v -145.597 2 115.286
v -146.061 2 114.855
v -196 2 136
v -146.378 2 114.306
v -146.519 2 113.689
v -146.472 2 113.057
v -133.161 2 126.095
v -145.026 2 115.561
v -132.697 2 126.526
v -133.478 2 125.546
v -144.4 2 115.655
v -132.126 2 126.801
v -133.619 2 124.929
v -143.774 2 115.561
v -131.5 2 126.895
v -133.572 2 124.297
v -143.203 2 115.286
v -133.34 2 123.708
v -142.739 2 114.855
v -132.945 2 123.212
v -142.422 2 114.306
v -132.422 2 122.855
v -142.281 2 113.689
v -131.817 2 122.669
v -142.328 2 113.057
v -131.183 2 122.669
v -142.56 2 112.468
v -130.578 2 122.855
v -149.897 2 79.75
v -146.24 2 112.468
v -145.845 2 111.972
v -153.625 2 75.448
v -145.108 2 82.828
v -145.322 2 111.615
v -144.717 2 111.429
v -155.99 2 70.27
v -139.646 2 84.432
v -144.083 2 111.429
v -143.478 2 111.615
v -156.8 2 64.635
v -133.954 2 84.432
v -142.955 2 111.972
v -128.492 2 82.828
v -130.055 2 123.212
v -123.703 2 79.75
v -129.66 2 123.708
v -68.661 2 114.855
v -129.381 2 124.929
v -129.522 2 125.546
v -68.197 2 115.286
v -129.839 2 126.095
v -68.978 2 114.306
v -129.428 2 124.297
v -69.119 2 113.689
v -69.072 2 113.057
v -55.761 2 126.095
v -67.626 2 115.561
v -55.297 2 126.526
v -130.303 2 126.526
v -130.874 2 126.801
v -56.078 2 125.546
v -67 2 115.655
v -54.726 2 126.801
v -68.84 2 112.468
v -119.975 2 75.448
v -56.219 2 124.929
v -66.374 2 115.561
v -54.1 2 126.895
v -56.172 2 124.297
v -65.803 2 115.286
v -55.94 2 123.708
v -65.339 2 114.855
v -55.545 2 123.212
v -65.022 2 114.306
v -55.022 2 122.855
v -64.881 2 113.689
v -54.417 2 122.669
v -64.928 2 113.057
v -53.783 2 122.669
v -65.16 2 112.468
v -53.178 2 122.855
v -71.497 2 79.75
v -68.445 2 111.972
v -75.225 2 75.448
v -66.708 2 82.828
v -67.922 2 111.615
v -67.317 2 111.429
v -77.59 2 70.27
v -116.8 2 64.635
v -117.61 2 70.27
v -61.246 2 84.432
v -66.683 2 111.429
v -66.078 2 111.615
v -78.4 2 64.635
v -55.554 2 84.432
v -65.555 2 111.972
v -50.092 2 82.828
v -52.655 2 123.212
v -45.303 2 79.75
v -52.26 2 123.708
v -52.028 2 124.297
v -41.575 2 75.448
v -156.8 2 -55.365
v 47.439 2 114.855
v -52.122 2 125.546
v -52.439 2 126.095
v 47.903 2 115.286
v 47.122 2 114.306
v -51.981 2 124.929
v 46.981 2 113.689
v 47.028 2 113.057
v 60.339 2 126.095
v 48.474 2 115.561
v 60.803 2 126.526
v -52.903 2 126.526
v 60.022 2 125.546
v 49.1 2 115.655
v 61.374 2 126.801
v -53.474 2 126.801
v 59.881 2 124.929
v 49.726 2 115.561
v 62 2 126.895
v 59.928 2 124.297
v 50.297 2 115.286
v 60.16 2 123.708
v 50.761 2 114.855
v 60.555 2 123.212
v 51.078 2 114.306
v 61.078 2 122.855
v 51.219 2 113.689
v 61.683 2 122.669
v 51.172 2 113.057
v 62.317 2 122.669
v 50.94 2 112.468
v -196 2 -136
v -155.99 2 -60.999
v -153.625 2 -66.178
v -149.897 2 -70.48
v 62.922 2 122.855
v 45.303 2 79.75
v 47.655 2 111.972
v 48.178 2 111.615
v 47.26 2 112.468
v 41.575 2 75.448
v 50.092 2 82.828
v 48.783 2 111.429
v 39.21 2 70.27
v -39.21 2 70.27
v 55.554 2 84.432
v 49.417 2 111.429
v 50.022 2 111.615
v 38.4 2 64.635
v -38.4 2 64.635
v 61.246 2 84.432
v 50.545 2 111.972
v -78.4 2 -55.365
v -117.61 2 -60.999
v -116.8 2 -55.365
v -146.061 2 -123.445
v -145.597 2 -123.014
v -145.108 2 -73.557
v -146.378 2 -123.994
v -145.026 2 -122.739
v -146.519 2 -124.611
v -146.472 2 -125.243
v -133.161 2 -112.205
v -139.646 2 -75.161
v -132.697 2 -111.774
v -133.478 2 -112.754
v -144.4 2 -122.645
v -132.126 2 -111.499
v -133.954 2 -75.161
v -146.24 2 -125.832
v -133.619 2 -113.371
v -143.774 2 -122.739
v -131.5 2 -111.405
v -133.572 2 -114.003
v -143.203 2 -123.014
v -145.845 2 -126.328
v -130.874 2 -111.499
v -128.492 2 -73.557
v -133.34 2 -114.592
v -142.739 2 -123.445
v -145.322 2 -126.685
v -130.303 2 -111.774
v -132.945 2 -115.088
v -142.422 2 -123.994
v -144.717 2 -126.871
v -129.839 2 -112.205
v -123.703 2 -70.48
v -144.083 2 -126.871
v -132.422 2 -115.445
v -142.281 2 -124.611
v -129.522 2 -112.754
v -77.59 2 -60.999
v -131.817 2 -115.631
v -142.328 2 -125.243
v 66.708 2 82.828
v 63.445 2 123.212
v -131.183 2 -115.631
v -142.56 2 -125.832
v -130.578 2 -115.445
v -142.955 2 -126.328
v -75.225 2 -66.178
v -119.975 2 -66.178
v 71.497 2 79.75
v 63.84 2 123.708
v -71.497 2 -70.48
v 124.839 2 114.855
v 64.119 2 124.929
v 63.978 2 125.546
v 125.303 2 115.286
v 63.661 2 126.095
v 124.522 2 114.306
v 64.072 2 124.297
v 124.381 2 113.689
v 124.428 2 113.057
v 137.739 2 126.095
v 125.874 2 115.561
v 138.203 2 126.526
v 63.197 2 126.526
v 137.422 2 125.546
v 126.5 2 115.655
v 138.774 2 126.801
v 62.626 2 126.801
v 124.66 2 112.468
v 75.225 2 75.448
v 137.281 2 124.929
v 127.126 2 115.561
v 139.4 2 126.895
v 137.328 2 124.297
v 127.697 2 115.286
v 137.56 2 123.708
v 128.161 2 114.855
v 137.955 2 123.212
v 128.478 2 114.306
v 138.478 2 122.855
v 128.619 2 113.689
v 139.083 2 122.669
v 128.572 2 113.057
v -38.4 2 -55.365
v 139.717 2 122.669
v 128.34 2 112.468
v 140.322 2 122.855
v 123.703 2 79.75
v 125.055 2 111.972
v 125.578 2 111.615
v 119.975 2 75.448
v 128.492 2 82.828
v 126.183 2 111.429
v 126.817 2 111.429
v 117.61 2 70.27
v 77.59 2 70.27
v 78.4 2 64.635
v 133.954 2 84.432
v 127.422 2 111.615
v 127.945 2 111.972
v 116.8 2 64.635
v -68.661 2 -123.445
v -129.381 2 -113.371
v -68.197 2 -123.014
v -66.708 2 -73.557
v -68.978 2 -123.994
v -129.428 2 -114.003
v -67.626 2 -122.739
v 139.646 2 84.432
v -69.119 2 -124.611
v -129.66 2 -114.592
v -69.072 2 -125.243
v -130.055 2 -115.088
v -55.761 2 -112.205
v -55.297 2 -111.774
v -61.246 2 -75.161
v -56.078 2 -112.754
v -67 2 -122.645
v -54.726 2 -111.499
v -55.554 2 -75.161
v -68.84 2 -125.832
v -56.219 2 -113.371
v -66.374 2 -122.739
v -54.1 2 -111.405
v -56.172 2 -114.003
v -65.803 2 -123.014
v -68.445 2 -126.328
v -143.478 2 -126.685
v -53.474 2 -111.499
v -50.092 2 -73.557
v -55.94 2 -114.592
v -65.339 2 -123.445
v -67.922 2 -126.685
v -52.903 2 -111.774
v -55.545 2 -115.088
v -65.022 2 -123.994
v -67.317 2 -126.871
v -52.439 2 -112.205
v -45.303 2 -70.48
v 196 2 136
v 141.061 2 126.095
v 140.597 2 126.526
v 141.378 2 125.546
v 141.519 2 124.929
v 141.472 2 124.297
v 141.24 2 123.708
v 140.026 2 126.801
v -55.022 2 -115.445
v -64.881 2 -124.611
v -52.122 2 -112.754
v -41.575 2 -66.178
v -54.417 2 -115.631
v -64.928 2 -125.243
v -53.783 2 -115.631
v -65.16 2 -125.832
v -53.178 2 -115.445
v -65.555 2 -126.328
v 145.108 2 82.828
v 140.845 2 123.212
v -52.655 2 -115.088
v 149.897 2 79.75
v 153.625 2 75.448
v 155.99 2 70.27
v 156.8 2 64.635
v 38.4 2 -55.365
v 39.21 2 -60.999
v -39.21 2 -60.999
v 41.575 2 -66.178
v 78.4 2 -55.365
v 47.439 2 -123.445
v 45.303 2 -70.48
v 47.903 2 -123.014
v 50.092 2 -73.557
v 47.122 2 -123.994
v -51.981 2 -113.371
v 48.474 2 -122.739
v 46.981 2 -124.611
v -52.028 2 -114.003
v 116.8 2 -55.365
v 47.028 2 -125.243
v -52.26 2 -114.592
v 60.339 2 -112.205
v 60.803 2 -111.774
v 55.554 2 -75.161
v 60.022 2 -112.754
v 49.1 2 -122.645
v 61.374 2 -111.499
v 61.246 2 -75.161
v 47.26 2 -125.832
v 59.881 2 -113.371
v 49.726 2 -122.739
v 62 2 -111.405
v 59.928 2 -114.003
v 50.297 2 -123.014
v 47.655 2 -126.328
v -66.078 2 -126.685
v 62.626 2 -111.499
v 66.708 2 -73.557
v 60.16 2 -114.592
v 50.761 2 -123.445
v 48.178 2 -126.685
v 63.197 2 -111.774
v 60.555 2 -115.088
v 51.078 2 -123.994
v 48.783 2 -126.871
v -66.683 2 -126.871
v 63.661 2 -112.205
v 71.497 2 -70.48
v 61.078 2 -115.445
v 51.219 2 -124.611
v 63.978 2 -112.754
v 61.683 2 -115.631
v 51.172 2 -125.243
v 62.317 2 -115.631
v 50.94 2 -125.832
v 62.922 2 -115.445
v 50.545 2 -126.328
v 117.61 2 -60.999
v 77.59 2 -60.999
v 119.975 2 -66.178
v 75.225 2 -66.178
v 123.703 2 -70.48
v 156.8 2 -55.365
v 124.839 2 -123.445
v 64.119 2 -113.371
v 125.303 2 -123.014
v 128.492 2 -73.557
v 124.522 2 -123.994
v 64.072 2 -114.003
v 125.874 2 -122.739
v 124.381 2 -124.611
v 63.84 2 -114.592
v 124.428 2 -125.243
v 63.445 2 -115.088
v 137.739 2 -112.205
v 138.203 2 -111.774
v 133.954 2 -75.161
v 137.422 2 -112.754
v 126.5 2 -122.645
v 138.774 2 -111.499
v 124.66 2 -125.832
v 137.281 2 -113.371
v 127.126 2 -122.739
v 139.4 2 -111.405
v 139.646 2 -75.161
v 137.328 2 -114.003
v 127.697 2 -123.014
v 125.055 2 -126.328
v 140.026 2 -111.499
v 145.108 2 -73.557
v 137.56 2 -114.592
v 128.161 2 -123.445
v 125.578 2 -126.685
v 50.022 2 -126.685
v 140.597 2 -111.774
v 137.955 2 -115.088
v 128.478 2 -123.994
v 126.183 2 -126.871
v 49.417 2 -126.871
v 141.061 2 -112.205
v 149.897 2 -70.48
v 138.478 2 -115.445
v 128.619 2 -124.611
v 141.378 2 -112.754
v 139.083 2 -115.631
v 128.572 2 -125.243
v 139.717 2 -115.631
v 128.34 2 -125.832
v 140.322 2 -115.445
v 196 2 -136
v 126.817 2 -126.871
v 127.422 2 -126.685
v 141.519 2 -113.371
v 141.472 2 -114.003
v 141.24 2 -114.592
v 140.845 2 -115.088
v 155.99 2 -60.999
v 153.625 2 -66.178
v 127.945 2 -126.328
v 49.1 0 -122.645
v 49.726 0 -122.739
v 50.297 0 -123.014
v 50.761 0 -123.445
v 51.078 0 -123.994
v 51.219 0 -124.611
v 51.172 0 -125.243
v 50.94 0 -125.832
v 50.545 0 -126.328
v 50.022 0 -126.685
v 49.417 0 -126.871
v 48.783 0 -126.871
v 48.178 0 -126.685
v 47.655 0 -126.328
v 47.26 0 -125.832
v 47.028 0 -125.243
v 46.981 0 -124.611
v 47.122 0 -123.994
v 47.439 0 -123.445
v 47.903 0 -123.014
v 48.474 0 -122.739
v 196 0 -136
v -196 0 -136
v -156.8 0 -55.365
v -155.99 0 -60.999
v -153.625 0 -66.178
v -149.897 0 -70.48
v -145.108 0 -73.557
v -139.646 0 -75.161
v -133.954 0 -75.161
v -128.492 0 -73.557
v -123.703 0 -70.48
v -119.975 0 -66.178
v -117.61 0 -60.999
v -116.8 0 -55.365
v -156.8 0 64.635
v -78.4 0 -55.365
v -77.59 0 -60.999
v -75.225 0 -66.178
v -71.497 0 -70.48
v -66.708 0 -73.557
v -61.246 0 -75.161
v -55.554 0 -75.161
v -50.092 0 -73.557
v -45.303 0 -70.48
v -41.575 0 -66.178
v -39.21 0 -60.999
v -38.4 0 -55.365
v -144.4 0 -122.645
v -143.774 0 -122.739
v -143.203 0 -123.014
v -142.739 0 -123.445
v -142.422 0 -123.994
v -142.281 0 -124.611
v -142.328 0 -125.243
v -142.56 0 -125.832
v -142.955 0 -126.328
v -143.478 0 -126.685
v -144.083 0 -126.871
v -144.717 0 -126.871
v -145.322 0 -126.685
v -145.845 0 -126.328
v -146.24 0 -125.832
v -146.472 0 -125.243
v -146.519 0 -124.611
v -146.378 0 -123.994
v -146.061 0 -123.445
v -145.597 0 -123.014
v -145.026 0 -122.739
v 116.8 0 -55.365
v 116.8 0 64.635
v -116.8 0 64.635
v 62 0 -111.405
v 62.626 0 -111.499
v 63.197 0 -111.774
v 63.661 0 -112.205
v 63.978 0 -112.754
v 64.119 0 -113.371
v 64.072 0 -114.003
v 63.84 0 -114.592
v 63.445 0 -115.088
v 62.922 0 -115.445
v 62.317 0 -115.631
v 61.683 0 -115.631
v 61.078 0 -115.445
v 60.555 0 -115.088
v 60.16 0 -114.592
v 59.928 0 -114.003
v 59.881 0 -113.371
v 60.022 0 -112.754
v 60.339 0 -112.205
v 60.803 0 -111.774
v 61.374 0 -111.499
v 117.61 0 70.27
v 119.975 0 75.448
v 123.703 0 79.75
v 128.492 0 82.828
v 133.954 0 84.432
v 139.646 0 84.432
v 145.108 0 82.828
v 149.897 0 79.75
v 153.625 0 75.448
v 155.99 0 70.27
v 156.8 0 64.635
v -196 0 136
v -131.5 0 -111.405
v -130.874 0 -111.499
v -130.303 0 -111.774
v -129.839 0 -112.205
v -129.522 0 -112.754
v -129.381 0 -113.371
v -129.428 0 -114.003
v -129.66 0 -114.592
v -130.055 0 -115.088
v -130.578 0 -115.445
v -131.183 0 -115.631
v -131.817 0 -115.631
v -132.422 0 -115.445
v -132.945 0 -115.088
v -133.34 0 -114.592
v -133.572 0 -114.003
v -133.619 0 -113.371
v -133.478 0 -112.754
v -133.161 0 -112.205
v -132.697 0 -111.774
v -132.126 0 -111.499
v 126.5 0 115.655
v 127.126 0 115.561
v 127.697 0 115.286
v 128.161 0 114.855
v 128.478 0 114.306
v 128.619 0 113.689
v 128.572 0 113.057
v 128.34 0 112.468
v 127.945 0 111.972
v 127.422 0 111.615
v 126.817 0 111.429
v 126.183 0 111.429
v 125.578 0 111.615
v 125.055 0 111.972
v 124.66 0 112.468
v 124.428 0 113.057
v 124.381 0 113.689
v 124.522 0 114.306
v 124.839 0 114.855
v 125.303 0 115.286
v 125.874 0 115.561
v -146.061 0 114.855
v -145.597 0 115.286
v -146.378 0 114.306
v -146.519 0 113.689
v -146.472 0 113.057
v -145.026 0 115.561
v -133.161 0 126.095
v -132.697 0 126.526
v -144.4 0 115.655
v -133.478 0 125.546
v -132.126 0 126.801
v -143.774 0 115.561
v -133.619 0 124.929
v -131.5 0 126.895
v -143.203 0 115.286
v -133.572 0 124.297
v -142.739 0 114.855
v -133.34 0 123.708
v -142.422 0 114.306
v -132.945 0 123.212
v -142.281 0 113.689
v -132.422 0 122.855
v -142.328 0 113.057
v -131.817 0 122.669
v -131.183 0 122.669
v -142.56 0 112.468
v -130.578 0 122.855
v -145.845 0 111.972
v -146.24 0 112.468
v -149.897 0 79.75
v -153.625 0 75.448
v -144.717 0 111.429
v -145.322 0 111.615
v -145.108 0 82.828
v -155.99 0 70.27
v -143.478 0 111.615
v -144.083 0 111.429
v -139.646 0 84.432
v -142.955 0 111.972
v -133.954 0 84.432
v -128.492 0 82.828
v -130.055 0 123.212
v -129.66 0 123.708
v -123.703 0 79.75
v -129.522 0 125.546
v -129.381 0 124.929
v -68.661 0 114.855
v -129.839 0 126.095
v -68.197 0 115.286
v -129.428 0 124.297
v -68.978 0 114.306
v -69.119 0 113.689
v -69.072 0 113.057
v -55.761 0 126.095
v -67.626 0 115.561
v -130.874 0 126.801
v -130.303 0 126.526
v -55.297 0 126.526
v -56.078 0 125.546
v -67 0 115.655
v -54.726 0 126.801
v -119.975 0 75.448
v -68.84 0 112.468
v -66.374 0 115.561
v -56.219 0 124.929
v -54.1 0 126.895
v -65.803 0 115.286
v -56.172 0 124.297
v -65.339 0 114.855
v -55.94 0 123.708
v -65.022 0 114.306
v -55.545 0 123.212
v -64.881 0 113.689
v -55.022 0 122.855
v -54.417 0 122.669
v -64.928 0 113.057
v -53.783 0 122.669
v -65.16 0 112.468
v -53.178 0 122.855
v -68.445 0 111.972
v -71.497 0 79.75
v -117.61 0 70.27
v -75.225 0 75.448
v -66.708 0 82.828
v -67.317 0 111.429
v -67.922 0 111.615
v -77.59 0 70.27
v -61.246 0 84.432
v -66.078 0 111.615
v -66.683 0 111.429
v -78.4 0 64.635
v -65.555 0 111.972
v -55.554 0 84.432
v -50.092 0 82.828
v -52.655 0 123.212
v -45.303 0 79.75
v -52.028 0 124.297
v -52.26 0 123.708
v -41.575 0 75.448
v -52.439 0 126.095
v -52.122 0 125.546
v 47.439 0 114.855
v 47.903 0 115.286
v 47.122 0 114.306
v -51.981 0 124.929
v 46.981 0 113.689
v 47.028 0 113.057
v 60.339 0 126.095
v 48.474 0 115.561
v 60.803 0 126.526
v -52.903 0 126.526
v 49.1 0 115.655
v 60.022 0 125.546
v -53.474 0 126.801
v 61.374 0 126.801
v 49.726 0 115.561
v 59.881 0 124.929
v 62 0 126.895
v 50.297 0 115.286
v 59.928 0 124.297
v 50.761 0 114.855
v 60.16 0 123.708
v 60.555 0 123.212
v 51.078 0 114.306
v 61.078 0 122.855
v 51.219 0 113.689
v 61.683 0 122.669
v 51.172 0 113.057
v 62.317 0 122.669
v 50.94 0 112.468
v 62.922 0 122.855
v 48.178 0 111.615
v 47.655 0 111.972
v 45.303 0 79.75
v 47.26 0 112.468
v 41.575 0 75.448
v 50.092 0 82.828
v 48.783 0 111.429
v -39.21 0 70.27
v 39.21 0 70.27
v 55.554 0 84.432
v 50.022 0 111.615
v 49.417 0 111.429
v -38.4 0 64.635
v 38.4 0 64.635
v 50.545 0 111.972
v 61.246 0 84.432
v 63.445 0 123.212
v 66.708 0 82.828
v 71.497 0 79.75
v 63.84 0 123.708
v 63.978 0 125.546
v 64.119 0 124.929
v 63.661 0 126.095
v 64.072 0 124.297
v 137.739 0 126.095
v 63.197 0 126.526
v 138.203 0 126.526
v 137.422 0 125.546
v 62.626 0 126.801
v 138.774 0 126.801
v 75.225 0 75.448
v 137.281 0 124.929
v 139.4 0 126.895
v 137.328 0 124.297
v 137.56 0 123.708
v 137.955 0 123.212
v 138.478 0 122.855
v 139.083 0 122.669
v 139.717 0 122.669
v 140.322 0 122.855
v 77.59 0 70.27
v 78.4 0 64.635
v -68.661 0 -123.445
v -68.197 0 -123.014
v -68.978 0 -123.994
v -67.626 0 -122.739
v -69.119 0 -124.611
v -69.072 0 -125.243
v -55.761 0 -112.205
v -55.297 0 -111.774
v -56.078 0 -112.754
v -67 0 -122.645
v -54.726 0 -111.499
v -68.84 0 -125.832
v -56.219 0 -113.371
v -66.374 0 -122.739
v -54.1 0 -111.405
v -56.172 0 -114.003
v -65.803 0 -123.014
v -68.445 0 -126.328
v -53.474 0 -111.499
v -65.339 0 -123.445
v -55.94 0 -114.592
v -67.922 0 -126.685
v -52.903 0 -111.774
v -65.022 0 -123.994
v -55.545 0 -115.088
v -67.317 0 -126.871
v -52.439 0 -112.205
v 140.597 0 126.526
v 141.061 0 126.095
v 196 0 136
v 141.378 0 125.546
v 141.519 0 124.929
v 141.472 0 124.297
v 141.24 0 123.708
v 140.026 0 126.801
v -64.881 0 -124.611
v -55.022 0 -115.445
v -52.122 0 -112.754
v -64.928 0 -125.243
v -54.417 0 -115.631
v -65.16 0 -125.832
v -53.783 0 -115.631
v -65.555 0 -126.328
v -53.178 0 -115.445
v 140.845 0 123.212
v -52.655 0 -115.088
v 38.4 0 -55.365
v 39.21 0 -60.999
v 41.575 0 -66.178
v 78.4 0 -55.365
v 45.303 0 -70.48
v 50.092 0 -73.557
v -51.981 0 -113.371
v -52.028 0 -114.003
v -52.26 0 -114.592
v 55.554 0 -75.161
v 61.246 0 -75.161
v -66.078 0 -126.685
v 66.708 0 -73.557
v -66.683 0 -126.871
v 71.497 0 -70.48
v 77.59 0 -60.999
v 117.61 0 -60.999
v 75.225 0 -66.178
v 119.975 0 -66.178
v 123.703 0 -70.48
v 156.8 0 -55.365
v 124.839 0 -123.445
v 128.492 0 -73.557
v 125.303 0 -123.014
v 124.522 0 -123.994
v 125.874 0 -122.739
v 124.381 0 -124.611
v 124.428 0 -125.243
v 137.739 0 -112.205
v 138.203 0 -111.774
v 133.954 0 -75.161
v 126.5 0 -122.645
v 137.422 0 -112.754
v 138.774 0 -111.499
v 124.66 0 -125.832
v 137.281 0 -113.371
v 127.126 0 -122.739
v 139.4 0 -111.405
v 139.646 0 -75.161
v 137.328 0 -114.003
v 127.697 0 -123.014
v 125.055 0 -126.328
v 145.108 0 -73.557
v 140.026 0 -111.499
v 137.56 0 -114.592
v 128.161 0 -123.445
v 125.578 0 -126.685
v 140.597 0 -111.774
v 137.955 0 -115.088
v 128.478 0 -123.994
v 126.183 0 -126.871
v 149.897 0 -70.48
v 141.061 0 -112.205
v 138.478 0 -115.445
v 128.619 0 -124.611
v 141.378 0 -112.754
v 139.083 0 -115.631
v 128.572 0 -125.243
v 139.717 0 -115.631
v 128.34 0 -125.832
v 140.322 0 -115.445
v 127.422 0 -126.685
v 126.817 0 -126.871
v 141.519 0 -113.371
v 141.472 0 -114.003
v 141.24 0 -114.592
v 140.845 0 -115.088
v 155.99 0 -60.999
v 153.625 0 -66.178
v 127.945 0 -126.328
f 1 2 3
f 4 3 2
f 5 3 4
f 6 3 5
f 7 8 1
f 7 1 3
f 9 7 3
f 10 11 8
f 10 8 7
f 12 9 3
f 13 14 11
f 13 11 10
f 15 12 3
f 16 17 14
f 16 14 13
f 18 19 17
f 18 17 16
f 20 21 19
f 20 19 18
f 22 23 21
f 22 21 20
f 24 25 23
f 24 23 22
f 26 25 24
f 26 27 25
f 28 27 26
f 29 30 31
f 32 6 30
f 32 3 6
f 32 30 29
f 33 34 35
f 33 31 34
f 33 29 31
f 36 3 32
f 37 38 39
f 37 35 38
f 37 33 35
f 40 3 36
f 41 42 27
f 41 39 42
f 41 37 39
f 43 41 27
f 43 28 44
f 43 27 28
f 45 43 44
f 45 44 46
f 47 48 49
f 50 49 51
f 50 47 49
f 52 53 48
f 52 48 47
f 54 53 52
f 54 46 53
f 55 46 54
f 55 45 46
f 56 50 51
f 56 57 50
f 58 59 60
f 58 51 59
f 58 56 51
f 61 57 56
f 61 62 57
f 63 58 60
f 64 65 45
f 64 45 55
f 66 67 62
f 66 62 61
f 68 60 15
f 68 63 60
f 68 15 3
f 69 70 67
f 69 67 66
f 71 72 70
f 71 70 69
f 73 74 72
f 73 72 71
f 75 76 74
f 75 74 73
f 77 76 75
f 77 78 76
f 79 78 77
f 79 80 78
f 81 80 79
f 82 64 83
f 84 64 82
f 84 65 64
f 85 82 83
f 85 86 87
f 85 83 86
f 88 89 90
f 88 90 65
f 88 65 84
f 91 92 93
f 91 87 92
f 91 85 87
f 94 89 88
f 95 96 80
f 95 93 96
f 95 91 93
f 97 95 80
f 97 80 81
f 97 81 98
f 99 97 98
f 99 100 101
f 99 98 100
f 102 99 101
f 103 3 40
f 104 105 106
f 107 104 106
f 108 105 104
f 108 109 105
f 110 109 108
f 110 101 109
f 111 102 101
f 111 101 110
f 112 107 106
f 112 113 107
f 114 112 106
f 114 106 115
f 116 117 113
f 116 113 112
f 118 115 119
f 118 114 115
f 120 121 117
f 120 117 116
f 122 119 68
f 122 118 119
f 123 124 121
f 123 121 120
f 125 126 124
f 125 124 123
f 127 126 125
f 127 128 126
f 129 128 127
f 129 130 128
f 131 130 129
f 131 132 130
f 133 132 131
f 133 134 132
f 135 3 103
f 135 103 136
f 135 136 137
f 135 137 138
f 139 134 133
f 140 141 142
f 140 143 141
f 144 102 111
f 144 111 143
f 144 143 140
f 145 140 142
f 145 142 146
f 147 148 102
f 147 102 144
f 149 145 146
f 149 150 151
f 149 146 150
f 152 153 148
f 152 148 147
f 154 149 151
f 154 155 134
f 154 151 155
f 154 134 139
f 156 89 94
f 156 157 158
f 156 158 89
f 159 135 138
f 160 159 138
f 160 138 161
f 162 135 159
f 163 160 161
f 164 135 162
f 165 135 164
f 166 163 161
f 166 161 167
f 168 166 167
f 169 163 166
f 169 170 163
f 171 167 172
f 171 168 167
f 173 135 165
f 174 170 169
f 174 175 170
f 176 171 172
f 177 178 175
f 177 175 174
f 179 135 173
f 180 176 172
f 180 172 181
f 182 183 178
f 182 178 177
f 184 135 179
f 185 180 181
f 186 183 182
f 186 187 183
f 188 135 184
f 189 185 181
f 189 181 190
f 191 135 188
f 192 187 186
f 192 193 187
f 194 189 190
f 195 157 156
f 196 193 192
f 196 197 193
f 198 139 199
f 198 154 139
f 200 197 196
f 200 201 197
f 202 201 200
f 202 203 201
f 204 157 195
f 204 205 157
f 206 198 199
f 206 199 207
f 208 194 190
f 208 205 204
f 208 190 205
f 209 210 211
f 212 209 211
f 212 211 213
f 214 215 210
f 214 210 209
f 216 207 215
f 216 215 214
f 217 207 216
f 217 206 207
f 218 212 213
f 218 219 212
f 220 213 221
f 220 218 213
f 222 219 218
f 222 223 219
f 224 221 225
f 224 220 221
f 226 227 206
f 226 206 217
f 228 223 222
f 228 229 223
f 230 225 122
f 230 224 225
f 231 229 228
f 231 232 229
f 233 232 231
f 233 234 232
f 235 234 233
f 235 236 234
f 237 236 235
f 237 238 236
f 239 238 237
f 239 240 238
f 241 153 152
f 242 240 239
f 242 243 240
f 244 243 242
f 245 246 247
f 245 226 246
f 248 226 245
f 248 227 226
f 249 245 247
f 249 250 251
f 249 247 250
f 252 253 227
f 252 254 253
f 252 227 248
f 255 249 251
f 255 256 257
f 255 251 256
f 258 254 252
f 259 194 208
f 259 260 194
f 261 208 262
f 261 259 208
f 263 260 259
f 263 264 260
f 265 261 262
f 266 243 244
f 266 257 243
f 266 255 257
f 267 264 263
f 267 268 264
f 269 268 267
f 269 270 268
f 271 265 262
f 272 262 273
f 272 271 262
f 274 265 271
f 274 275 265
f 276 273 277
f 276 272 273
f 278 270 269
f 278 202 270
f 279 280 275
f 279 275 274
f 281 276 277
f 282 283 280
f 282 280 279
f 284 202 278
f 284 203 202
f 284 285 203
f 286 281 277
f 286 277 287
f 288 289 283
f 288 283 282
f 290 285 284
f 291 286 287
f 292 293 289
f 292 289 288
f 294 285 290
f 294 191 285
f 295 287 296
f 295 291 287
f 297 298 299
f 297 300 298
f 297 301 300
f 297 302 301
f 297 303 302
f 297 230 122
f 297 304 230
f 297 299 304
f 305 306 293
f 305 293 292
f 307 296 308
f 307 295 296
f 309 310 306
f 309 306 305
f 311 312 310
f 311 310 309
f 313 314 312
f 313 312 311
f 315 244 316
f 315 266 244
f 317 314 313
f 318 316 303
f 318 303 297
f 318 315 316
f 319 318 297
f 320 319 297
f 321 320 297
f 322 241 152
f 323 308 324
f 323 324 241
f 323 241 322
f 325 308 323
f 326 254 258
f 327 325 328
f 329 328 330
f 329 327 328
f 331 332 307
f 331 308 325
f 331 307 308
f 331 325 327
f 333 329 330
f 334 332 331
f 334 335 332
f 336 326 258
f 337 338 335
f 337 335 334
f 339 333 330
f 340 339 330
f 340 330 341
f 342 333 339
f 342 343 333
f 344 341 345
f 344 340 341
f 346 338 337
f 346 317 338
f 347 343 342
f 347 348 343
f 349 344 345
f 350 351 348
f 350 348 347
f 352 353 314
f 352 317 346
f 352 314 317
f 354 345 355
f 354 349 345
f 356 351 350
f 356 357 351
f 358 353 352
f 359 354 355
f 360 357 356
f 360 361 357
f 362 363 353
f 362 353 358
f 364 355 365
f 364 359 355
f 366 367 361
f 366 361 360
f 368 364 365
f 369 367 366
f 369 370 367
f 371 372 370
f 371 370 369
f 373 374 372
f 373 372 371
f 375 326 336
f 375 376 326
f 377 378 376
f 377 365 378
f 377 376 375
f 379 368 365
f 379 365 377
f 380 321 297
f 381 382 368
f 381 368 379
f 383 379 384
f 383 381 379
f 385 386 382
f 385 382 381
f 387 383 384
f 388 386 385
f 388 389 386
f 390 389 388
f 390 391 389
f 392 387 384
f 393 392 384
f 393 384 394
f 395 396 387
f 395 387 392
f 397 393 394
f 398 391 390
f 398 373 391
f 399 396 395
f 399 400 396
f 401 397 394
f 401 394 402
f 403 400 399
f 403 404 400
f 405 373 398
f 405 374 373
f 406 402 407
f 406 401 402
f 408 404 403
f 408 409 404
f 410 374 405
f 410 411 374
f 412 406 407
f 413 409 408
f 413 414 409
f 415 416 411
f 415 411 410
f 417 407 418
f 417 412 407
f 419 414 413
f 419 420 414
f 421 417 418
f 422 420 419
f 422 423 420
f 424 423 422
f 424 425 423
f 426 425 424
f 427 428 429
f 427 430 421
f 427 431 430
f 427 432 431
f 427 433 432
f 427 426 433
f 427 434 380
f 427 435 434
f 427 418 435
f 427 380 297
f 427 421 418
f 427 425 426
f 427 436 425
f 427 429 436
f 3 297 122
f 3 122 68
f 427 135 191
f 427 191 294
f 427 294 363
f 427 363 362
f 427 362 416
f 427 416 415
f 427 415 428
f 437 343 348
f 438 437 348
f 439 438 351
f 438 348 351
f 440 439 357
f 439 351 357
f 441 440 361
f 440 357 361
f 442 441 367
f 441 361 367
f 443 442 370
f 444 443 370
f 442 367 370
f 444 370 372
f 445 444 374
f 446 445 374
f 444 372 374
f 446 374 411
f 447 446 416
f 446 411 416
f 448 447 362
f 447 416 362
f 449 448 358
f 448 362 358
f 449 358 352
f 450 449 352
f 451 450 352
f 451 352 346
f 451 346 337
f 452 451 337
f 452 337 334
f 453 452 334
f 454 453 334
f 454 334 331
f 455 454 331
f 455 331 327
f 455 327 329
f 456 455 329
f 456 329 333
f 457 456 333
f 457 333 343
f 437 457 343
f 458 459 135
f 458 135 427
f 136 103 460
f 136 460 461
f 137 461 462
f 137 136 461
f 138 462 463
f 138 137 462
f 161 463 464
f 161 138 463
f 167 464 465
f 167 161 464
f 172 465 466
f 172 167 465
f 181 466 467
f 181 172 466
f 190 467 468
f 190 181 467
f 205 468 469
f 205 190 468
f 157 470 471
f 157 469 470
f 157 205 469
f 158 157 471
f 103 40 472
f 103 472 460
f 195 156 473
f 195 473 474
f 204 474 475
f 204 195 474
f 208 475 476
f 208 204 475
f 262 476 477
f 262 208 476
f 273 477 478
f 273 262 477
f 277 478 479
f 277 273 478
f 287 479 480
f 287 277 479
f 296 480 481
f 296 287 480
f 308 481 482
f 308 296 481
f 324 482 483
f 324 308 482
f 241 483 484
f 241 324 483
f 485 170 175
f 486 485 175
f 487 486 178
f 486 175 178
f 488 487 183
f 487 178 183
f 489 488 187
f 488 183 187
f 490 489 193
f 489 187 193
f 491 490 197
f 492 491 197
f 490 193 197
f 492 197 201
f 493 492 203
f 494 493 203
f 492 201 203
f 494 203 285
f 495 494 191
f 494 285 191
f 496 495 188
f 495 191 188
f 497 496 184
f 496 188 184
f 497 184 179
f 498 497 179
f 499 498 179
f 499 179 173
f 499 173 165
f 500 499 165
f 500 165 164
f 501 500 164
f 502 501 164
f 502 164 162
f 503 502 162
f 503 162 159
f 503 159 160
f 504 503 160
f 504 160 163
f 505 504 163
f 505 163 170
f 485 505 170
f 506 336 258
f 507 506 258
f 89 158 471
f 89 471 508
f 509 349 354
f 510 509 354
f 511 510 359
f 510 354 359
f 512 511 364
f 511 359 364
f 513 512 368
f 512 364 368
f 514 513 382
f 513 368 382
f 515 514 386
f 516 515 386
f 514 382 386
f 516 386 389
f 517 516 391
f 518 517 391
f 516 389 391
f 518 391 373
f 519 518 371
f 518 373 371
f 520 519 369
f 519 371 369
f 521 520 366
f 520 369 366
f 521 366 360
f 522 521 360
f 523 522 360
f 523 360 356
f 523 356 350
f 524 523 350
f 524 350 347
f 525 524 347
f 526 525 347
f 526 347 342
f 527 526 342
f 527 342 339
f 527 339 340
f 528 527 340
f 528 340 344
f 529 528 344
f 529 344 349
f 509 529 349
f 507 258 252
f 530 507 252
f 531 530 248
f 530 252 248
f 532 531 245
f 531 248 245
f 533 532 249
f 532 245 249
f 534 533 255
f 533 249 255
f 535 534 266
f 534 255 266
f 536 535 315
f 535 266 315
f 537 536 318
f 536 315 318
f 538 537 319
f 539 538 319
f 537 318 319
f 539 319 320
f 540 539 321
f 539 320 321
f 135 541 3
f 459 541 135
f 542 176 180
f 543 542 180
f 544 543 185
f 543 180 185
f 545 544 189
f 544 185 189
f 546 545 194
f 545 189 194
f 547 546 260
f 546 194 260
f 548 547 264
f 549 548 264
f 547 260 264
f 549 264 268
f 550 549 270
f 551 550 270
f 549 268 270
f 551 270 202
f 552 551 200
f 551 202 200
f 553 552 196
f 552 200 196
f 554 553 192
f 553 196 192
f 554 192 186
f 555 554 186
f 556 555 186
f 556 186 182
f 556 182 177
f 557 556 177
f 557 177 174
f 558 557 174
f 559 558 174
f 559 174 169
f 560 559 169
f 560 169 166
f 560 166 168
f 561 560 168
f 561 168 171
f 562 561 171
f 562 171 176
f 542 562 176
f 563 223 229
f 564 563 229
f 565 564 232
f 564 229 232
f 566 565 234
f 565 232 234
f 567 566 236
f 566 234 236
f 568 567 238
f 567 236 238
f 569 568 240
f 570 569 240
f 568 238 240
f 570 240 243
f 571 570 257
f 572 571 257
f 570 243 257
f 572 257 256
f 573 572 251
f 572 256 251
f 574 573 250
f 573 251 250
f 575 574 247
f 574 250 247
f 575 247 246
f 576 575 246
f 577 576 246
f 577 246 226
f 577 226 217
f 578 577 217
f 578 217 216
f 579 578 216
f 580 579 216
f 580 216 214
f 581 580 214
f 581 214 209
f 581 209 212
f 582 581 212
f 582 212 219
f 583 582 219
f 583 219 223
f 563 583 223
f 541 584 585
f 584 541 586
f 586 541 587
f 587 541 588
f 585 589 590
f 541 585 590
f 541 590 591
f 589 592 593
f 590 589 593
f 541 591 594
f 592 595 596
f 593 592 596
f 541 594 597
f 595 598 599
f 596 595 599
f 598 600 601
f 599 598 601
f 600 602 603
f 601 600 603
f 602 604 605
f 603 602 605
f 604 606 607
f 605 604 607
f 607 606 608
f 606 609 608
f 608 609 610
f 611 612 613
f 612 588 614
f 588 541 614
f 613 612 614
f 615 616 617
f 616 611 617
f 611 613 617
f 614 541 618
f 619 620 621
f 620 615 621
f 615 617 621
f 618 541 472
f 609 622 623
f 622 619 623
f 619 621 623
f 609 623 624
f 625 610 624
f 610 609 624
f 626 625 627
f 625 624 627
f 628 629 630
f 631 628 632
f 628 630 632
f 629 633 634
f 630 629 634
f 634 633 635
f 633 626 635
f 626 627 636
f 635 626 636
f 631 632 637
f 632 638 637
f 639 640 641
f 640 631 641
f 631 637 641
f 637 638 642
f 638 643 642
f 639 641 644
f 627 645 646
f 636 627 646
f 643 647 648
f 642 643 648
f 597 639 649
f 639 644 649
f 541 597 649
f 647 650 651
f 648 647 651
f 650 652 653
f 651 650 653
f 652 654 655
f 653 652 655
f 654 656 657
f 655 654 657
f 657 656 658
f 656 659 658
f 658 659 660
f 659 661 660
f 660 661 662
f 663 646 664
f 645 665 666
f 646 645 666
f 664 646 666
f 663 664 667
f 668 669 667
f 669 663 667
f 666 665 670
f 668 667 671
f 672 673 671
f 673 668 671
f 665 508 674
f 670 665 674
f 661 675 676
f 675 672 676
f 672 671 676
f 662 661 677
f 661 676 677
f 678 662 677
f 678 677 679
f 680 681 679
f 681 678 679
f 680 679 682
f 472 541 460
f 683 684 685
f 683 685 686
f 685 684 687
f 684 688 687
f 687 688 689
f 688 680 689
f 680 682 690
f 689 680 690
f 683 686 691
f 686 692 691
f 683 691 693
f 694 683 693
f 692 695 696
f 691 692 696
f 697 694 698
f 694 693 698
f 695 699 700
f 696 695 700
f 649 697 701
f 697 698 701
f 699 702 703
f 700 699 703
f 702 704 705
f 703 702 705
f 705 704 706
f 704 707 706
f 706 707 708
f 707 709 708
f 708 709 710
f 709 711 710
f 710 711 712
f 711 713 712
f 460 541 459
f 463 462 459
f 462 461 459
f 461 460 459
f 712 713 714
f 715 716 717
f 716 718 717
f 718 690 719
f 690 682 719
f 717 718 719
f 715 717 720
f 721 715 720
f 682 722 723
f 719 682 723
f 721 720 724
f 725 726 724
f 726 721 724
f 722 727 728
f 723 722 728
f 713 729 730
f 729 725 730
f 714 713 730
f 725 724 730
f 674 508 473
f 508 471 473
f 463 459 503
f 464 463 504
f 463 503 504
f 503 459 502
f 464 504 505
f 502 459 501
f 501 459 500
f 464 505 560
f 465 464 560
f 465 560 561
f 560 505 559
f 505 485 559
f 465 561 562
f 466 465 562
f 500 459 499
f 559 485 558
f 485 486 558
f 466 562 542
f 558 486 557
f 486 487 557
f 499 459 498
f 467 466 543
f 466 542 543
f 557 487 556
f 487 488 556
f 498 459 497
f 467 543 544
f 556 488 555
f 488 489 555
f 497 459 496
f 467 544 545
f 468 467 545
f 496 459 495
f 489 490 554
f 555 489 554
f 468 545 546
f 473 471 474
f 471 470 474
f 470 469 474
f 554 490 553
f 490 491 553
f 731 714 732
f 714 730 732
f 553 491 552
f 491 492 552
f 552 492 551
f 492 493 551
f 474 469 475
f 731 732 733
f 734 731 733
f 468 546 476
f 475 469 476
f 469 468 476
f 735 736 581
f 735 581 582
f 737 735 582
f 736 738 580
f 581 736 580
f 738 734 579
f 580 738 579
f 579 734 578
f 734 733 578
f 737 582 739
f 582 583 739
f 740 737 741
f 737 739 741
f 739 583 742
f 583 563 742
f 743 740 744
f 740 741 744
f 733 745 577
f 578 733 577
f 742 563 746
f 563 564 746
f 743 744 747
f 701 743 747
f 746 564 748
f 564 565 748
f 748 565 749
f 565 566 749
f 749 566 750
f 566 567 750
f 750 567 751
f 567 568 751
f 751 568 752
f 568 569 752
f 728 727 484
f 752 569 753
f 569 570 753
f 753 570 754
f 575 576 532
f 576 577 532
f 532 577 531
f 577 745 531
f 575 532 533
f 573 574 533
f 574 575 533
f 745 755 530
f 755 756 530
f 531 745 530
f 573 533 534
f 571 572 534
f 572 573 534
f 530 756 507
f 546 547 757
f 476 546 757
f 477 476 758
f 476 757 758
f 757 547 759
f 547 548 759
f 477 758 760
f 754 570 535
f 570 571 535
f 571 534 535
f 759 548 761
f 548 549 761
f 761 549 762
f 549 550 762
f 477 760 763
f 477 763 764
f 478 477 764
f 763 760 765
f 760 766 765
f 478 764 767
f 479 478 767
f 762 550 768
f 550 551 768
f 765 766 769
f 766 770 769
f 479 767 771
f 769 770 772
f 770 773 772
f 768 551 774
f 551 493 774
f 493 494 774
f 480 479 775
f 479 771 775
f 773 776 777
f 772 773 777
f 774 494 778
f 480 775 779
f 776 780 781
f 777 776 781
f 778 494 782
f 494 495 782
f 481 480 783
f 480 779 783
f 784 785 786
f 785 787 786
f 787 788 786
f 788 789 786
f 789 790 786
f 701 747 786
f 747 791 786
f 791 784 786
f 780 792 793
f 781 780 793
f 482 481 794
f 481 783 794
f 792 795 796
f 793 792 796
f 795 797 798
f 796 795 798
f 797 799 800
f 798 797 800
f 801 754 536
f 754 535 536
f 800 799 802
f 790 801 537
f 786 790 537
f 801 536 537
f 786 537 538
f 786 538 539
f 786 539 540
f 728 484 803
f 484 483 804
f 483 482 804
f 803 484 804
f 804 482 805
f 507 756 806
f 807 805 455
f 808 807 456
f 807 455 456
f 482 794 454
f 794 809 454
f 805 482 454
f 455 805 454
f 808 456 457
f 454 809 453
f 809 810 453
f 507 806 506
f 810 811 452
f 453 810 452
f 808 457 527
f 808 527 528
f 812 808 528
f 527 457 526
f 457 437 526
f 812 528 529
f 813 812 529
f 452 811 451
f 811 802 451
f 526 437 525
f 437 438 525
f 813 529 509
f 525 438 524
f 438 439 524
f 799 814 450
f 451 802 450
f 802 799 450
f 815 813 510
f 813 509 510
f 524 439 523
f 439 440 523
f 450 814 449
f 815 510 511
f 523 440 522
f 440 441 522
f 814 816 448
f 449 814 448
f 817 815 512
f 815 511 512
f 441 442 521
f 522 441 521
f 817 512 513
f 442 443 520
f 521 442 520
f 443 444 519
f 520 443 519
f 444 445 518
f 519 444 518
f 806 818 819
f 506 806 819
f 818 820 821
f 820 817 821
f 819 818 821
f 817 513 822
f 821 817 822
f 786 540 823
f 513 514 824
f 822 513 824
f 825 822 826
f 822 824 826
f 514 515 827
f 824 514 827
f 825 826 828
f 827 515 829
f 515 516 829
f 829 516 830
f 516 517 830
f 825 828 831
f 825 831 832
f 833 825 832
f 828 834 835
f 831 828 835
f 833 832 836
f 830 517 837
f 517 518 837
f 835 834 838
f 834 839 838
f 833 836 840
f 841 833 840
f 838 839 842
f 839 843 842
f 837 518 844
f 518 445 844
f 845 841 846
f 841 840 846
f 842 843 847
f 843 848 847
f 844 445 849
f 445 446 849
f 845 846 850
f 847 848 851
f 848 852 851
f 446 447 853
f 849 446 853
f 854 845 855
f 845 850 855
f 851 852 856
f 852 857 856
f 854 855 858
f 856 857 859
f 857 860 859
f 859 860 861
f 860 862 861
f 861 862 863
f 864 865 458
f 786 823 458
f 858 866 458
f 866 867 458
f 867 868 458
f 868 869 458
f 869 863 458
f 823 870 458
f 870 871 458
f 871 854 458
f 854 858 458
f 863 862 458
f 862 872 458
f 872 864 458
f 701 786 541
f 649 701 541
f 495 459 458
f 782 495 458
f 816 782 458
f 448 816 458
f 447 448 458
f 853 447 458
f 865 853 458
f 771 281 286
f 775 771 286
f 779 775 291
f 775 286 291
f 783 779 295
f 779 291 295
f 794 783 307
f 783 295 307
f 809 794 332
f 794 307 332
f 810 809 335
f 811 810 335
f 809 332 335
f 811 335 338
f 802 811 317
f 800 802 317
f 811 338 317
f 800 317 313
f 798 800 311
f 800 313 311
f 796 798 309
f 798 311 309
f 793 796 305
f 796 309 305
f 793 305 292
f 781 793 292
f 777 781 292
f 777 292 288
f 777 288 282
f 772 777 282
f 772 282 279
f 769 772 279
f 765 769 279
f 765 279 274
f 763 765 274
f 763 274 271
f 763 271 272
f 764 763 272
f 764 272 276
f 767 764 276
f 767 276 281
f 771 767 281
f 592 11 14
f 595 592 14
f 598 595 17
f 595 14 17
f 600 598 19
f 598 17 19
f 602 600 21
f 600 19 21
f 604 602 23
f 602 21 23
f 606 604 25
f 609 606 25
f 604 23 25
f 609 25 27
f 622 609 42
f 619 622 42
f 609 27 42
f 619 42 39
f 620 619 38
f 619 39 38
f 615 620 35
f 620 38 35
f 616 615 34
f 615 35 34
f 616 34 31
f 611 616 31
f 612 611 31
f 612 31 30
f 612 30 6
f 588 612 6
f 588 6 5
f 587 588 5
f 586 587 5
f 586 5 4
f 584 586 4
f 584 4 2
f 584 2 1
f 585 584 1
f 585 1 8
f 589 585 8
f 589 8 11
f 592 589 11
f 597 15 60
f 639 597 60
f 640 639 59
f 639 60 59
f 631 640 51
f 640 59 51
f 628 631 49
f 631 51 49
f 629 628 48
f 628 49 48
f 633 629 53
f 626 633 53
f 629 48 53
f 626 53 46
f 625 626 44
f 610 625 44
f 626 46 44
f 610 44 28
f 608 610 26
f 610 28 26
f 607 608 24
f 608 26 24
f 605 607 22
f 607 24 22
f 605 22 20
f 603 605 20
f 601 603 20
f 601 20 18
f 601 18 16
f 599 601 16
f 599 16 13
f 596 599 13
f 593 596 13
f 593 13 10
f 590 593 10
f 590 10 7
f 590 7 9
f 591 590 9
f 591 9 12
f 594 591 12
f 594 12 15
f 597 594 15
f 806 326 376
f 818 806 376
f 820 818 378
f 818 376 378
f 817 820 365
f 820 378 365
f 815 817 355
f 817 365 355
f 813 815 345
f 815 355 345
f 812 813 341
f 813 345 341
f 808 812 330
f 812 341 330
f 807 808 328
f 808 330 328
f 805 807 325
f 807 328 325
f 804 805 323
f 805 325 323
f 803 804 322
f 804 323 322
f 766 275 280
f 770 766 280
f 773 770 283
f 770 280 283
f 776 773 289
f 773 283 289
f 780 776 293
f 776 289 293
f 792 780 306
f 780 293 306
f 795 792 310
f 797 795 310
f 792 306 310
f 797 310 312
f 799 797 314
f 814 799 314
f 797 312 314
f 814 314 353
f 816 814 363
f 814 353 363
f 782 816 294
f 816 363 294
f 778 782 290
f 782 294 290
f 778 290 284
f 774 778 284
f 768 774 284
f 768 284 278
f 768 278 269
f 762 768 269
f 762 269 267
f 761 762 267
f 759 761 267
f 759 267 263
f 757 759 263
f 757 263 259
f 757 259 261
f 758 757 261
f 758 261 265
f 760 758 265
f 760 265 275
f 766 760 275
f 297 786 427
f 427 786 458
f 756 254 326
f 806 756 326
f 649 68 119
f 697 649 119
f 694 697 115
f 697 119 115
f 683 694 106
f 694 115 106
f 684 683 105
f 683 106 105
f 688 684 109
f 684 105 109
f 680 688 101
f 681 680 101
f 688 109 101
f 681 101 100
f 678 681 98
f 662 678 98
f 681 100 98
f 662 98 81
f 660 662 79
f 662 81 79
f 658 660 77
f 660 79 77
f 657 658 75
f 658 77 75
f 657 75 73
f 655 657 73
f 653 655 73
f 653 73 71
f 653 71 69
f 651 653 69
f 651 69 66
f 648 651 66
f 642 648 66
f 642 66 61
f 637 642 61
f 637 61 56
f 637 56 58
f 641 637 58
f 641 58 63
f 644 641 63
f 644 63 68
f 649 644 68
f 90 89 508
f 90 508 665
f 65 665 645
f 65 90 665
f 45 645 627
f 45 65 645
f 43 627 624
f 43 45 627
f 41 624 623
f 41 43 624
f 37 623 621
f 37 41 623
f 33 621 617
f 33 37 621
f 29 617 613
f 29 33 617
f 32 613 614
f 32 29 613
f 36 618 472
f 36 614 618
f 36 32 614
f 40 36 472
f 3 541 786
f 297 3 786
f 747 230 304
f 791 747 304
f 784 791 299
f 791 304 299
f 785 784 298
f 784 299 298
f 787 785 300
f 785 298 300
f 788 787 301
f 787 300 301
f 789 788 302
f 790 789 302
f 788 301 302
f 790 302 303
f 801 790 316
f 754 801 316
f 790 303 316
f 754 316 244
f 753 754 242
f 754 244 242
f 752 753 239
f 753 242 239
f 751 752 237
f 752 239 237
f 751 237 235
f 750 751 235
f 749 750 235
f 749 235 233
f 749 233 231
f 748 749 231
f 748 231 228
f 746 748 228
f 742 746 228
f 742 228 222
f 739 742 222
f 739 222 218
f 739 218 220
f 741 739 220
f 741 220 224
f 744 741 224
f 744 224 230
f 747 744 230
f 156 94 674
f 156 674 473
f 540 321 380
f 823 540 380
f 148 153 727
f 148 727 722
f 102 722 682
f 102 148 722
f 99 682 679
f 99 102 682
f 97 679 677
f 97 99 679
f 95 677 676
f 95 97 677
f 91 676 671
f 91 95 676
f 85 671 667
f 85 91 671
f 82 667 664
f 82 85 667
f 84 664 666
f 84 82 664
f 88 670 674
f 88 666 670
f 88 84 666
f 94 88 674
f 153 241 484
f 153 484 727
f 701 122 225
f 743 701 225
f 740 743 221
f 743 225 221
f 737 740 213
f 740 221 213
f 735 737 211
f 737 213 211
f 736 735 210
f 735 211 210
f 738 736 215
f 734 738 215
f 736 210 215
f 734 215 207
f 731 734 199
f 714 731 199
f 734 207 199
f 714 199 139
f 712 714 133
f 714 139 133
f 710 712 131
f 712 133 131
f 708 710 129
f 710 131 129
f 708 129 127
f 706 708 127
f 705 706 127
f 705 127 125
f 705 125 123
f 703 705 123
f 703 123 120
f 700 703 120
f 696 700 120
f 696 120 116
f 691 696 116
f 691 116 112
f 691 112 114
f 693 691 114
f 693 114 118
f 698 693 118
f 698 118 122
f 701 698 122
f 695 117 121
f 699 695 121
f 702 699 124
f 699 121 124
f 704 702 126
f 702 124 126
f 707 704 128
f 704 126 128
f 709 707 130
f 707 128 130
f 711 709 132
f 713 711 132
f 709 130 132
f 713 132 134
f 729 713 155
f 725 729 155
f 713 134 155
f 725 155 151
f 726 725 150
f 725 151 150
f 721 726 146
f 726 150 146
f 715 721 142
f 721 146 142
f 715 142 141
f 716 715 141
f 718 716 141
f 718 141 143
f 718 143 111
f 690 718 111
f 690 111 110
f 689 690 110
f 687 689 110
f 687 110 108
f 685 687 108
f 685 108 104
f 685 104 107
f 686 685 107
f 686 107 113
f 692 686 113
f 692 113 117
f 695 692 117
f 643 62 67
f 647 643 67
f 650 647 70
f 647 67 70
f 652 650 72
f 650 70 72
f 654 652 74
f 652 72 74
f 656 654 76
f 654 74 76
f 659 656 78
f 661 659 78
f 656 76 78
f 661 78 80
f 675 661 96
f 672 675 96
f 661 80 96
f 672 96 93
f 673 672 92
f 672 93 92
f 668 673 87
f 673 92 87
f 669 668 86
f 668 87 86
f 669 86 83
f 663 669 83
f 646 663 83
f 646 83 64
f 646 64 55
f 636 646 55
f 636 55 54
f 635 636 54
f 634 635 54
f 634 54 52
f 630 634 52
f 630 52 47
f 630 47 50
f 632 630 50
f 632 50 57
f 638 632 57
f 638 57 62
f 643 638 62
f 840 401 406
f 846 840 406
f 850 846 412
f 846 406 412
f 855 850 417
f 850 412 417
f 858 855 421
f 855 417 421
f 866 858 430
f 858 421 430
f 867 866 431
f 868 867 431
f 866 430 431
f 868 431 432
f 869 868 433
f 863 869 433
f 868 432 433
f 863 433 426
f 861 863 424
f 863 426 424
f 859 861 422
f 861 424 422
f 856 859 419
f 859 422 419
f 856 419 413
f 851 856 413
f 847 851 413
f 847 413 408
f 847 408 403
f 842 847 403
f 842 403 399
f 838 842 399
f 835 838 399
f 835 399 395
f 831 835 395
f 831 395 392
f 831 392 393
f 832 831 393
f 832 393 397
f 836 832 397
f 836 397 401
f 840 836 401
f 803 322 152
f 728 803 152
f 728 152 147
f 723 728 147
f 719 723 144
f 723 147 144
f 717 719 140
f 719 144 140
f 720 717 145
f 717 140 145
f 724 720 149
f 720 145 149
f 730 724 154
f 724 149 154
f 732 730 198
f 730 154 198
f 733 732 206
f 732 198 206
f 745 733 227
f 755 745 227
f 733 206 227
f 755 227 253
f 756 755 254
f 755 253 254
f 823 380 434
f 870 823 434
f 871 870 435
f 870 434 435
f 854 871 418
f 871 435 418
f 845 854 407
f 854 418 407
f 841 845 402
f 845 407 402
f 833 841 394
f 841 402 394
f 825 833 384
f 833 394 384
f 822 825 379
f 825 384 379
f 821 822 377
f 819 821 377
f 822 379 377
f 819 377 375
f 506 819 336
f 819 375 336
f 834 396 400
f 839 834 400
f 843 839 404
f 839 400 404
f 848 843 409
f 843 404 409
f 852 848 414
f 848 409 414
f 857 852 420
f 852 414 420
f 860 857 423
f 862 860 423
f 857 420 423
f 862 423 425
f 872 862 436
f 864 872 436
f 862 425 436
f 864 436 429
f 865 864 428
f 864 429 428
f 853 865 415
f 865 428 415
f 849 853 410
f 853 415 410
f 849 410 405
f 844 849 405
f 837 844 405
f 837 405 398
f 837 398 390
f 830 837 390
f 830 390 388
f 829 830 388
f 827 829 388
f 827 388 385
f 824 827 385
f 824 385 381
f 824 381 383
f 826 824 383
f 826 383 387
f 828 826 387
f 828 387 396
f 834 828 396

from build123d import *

# Parameters (mm, degrees)
SKETCH1_W                 = 392
SKETCH1_H                 = 272
BOSS_EXTRUDE1_DEPTH       = 2
CUT_EXTRUDE1_REACH        = 240.571
SKETCH2_R                 = 2.125
LPATTERN1_COUNT           = 2
LPATTERN1_PITCH           = 77.4
LPATTERN7_COUNT           = 2
LPATTERN7_PITCH           = 193.5
LPATTERN7_COPY_1_REACH    = 240.571
LPATTERN7_COPY_1_SKETCH_R = 2.125
CUT_EXTRUDE2_DEPTH        = 239.570744225


with BuildPart() as part:
    # Sketch1 → Boss-Extrude1 (new body)
    with BuildSketch(Plane(origin=(0, 0, 0), x_dir=(1, 0, 0), z_dir=(0, 1, 0))):
        Rectangle(SKETCH1_W, SKETCH1_H)
    extrude(amount=BOSS_EXTRUDE1_DEPTH)

    # Sketch2 → Cut-Extrude1 (cut, up to next)
    with BuildSketch(Plane(origin=(0, 2, 0), x_dir=(1, 0, 0), z_dir=(0, 1, 0)), mode=Mode.PRIVATE) as cut_extrude1_sk1:
        with Locations(Location((139.4, -124.77, 0), (0, 0, 270))):
            Circle(SKETCH2_R)
    cut_extrude1_tool1 = extrude(cut_extrude1_sk1.sketch, amount=-CUT_EXTRUDE1_REACH, mode=Mode.PRIVATE) & part.part
    # Sketch2 → Cut-Extrude1 (cut, up to next)
    with BuildSketch(Plane(origin=(0, 2, 0), x_dir=(1, 0, 0), z_dir=(0, 1, 0)), mode=Mode.PRIVATE) as cut_extrude1_sk2:
        with Locations(Location((126.5, -113.53, 0), (0, 0, 270))):
            Circle(SKETCH2_R)
    cut_extrude1_tool2 = extrude(cut_extrude1_sk2.sketch, amount=-CUT_EXTRUDE1_REACH, mode=Mode.PRIVATE) & part.part
    # Sketch2 → Cut-Extrude1 (cut, up to next)
    with BuildSketch(Plane(origin=(0, 2, 0), x_dir=(1, 0, 0), z_dir=(0, 1, 0)), mode=Mode.PRIVATE) as cut_extrude1_sk3:
        with Locations(Location((126.5, 124.77, 0), (0, 0, 270))):
            Circle(SKETCH2_R)
    cut_extrude1_tool3 = extrude(cut_extrude1_sk3.sketch, amount=-CUT_EXTRUDE1_REACH, mode=Mode.PRIVATE) & part.part
    # Sketch2 → Cut-Extrude1 (cut, up to next)
    with BuildSketch(Plane(origin=(0, 2, 0), x_dir=(1, 0, 0), z_dir=(0, 1, 0)), mode=Mode.PRIVATE) as cut_extrude1_sk4:
        with Locations(Location((139.4, 113.53, 0), (0, 0, 270))):
            Circle(SKETCH2_R)
    cut_extrude1_tool4 = extrude(cut_extrude1_sk4.sketch, amount=-CUT_EXTRUDE1_REACH, mode=Mode.PRIVATE) & part.part
    cut_extrude1_1 = cut_extrude1_tool1.solids().sort_by_distance((139.4, 2, 124.77))[0]
    add(cut_extrude1_1, mode=Mode.SUBTRACT)
    cut_extrude1_2 = cut_extrude1_tool2.solids().sort_by_distance((126.5, 2, 113.53))[0]
    add(cut_extrude1_2, mode=Mode.SUBTRACT)
    cut_extrude1_3 = cut_extrude1_tool3.solids().sort_by_distance((126.5, 2, -124.77))[0]
    add(cut_extrude1_3, mode=Mode.SUBTRACT)
    cut_extrude1_4 = cut_extrude1_tool4.solids().sort_by_distance((139.4, 2, -113.53))[0]
    add(cut_extrude1_4, mode=Mode.SUBTRACT)
    cut_extrude1 = cut_extrude1_1 + cut_extrude1_2 + cut_extrude1_3 + cut_extrude1_4  # Cut-Extrude1 as one shape, for the pattern or mirror that repeats it

    # LPattern1: Cut-Extrude1 ×2
    with Locations(*[(-i * LPATTERN1_PITCH, 0, 0) for i in range(1, LPATTERN1_COUNT)]):
        add(cut_extrude1, mode=Mode.SUBTRACT)

    # LPattern7: Cut-Extrude1 ×2
    with Locations(*[(-i * LPATTERN7_PITCH, 0, 0) for i in range(1, LPATTERN7_COUNT)]):
        add(cut_extrude1, mode=Mode.SUBTRACT)

    # LPattern7 copy 1 sketch → LPattern7 copy 1 (cut, up to next)
    with BuildSketch(Plane(origin=(-270.9, 2, 0), x_dir=(1, 0, 0), z_dir=(0, 1, 0)), mode=Mode.PRIVATE) as lpattern7_copy_1_sk1:
        with Locations(Location((139.4, -124.77, 0), (0, 0, 270))):
            Circle(LPATTERN7_COPY_1_SKETCH_R)
    lpattern7_copy_1_tool1 = extrude(lpattern7_copy_1_sk1.sketch, amount=-LPATTERN7_COPY_1_REACH, mode=Mode.PRIVATE) & part.part
    # LPattern7 copy 1 sketch → LPattern7 copy 1 (cut, up to next)
    with BuildSketch(Plane(origin=(-270.9, 2, 0), x_dir=(1, 0, 0), z_dir=(0, 1, 0)), mode=Mode.PRIVATE) as lpattern7_copy_1_sk2:
        with Locations(Location((126.5, -113.53, 0), (0, 0, 270))):
            Circle(LPATTERN7_COPY_1_SKETCH_R)
    lpattern7_copy_1_tool2 = extrude(lpattern7_copy_1_sk2.sketch, amount=-LPATTERN7_COPY_1_REACH, mode=Mode.PRIVATE) & part.part
    # LPattern7 copy 1 sketch → LPattern7 copy 1 (cut, up to next)
    with BuildSketch(Plane(origin=(-270.9, 2, 0), x_dir=(1, 0, 0), z_dir=(0, 1, 0)), mode=Mode.PRIVATE) as lpattern7_copy_1_sk3:
        with Locations(Location((126.5, 124.77, 0), (0, 0, 270))):
            Circle(LPATTERN7_COPY_1_SKETCH_R)
    lpattern7_copy_1_tool3 = extrude(lpattern7_copy_1_sk3.sketch, amount=-LPATTERN7_COPY_1_REACH, mode=Mode.PRIVATE) & part.part
    # LPattern7 copy 1 sketch → LPattern7 copy 1 (cut, up to next)
    with BuildSketch(Plane(origin=(-270.9, 2, 0), x_dir=(1, 0, 0), z_dir=(0, 1, 0)), mode=Mode.PRIVATE) as lpattern7_copy_1_sk4:
        with Locations(Location((139.4, 113.53, 0), (0, 0, 270))):
            Circle(LPATTERN7_COPY_1_SKETCH_R)
    lpattern7_copy_1_tool4 = extrude(lpattern7_copy_1_sk4.sketch, amount=-LPATTERN7_COPY_1_REACH, mode=Mode.PRIVATE) & part.part
    add(lpattern7_copy_1_tool1.solids().sort_by_distance((-131.5, 2, 124.77))[0], mode=Mode.SUBTRACT)
    add(lpattern7_copy_1_tool2.solids().sort_by_distance((-144.4, 2, 113.53))[0], mode=Mode.SUBTRACT)
    add(lpattern7_copy_1_tool3.solids().sort_by_distance((-144.4, 2, -124.77))[0], mode=Mode.SUBTRACT)
    add(lpattern7_copy_1_tool4.solids().sort_by_distance((-131.5, 2, -113.53))[0], mode=Mode.SUBTRACT)

    # Sketch3 → Cut-Extrude2 (cut, through all)
    with BuildSketch(Plane(origin=(0, 2, 0), x_dir=(1, 0, 0), z_dir=(0, 1, 0))):
        with BuildLine():
            Line((-116.8, 55.364791438), (-116.8, -64.635208562))
            ThreePointArc((-116.8, -64.635208562), (-136.8, -84.635208562), (-156.8, -64.635208562))
            Line((-156.8, -64.635208562), (-156.8, 55.364791438))
            ThreePointArc((-156.8, 55.364791438), (-136.8, 75.364791438), (-116.8, 55.364791438))
        make_face()
        with BuildLine():
            Line((-38.4, 55.364791438), (-38.4, -64.635208562))
            ThreePointArc((-38.4, -64.635208562), (-58.4, -84.635208562), (-78.4, -64.635208562))
            Line((-78.4, -64.635208562), (-78.4, 55.364791438))
            ThreePointArc((-78.4, 55.364791438), (-58.4, 75.364791438), (-38.4, 55.364791438))
        make_face()
        with BuildLine():
            Line((38.4, 55.364791438), (38.4, -64.635208562))
            ThreePointArc((38.4, -64.635208562), (58.4, -84.635208562), (78.4, -64.635208562))
            Line((78.4, -64.635208562), (78.4, 55.364791438))
            ThreePointArc((78.4, 55.364791438), (58.4, 75.364791438), (38.4, 55.364791438))
        make_face()
        with BuildLine():
            Line((116.8, 55.364791438), (116.8, -64.635208562))
            ThreePointArc((116.8, -64.635208562), (136.8, -84.635208562), (156.8, -64.635208562))
            Line((156.8, -64.635208562), (156.8, 55.364791438))
            ThreePointArc((156.8, 55.364791438), (136.8, 75.364791438), (116.8, 55.364791438))
        make_face()
    extrude(amount=-CUT_EXTRUDE2_DEPTH, mode=Mode.SUBTRACT)


solid = part.part
